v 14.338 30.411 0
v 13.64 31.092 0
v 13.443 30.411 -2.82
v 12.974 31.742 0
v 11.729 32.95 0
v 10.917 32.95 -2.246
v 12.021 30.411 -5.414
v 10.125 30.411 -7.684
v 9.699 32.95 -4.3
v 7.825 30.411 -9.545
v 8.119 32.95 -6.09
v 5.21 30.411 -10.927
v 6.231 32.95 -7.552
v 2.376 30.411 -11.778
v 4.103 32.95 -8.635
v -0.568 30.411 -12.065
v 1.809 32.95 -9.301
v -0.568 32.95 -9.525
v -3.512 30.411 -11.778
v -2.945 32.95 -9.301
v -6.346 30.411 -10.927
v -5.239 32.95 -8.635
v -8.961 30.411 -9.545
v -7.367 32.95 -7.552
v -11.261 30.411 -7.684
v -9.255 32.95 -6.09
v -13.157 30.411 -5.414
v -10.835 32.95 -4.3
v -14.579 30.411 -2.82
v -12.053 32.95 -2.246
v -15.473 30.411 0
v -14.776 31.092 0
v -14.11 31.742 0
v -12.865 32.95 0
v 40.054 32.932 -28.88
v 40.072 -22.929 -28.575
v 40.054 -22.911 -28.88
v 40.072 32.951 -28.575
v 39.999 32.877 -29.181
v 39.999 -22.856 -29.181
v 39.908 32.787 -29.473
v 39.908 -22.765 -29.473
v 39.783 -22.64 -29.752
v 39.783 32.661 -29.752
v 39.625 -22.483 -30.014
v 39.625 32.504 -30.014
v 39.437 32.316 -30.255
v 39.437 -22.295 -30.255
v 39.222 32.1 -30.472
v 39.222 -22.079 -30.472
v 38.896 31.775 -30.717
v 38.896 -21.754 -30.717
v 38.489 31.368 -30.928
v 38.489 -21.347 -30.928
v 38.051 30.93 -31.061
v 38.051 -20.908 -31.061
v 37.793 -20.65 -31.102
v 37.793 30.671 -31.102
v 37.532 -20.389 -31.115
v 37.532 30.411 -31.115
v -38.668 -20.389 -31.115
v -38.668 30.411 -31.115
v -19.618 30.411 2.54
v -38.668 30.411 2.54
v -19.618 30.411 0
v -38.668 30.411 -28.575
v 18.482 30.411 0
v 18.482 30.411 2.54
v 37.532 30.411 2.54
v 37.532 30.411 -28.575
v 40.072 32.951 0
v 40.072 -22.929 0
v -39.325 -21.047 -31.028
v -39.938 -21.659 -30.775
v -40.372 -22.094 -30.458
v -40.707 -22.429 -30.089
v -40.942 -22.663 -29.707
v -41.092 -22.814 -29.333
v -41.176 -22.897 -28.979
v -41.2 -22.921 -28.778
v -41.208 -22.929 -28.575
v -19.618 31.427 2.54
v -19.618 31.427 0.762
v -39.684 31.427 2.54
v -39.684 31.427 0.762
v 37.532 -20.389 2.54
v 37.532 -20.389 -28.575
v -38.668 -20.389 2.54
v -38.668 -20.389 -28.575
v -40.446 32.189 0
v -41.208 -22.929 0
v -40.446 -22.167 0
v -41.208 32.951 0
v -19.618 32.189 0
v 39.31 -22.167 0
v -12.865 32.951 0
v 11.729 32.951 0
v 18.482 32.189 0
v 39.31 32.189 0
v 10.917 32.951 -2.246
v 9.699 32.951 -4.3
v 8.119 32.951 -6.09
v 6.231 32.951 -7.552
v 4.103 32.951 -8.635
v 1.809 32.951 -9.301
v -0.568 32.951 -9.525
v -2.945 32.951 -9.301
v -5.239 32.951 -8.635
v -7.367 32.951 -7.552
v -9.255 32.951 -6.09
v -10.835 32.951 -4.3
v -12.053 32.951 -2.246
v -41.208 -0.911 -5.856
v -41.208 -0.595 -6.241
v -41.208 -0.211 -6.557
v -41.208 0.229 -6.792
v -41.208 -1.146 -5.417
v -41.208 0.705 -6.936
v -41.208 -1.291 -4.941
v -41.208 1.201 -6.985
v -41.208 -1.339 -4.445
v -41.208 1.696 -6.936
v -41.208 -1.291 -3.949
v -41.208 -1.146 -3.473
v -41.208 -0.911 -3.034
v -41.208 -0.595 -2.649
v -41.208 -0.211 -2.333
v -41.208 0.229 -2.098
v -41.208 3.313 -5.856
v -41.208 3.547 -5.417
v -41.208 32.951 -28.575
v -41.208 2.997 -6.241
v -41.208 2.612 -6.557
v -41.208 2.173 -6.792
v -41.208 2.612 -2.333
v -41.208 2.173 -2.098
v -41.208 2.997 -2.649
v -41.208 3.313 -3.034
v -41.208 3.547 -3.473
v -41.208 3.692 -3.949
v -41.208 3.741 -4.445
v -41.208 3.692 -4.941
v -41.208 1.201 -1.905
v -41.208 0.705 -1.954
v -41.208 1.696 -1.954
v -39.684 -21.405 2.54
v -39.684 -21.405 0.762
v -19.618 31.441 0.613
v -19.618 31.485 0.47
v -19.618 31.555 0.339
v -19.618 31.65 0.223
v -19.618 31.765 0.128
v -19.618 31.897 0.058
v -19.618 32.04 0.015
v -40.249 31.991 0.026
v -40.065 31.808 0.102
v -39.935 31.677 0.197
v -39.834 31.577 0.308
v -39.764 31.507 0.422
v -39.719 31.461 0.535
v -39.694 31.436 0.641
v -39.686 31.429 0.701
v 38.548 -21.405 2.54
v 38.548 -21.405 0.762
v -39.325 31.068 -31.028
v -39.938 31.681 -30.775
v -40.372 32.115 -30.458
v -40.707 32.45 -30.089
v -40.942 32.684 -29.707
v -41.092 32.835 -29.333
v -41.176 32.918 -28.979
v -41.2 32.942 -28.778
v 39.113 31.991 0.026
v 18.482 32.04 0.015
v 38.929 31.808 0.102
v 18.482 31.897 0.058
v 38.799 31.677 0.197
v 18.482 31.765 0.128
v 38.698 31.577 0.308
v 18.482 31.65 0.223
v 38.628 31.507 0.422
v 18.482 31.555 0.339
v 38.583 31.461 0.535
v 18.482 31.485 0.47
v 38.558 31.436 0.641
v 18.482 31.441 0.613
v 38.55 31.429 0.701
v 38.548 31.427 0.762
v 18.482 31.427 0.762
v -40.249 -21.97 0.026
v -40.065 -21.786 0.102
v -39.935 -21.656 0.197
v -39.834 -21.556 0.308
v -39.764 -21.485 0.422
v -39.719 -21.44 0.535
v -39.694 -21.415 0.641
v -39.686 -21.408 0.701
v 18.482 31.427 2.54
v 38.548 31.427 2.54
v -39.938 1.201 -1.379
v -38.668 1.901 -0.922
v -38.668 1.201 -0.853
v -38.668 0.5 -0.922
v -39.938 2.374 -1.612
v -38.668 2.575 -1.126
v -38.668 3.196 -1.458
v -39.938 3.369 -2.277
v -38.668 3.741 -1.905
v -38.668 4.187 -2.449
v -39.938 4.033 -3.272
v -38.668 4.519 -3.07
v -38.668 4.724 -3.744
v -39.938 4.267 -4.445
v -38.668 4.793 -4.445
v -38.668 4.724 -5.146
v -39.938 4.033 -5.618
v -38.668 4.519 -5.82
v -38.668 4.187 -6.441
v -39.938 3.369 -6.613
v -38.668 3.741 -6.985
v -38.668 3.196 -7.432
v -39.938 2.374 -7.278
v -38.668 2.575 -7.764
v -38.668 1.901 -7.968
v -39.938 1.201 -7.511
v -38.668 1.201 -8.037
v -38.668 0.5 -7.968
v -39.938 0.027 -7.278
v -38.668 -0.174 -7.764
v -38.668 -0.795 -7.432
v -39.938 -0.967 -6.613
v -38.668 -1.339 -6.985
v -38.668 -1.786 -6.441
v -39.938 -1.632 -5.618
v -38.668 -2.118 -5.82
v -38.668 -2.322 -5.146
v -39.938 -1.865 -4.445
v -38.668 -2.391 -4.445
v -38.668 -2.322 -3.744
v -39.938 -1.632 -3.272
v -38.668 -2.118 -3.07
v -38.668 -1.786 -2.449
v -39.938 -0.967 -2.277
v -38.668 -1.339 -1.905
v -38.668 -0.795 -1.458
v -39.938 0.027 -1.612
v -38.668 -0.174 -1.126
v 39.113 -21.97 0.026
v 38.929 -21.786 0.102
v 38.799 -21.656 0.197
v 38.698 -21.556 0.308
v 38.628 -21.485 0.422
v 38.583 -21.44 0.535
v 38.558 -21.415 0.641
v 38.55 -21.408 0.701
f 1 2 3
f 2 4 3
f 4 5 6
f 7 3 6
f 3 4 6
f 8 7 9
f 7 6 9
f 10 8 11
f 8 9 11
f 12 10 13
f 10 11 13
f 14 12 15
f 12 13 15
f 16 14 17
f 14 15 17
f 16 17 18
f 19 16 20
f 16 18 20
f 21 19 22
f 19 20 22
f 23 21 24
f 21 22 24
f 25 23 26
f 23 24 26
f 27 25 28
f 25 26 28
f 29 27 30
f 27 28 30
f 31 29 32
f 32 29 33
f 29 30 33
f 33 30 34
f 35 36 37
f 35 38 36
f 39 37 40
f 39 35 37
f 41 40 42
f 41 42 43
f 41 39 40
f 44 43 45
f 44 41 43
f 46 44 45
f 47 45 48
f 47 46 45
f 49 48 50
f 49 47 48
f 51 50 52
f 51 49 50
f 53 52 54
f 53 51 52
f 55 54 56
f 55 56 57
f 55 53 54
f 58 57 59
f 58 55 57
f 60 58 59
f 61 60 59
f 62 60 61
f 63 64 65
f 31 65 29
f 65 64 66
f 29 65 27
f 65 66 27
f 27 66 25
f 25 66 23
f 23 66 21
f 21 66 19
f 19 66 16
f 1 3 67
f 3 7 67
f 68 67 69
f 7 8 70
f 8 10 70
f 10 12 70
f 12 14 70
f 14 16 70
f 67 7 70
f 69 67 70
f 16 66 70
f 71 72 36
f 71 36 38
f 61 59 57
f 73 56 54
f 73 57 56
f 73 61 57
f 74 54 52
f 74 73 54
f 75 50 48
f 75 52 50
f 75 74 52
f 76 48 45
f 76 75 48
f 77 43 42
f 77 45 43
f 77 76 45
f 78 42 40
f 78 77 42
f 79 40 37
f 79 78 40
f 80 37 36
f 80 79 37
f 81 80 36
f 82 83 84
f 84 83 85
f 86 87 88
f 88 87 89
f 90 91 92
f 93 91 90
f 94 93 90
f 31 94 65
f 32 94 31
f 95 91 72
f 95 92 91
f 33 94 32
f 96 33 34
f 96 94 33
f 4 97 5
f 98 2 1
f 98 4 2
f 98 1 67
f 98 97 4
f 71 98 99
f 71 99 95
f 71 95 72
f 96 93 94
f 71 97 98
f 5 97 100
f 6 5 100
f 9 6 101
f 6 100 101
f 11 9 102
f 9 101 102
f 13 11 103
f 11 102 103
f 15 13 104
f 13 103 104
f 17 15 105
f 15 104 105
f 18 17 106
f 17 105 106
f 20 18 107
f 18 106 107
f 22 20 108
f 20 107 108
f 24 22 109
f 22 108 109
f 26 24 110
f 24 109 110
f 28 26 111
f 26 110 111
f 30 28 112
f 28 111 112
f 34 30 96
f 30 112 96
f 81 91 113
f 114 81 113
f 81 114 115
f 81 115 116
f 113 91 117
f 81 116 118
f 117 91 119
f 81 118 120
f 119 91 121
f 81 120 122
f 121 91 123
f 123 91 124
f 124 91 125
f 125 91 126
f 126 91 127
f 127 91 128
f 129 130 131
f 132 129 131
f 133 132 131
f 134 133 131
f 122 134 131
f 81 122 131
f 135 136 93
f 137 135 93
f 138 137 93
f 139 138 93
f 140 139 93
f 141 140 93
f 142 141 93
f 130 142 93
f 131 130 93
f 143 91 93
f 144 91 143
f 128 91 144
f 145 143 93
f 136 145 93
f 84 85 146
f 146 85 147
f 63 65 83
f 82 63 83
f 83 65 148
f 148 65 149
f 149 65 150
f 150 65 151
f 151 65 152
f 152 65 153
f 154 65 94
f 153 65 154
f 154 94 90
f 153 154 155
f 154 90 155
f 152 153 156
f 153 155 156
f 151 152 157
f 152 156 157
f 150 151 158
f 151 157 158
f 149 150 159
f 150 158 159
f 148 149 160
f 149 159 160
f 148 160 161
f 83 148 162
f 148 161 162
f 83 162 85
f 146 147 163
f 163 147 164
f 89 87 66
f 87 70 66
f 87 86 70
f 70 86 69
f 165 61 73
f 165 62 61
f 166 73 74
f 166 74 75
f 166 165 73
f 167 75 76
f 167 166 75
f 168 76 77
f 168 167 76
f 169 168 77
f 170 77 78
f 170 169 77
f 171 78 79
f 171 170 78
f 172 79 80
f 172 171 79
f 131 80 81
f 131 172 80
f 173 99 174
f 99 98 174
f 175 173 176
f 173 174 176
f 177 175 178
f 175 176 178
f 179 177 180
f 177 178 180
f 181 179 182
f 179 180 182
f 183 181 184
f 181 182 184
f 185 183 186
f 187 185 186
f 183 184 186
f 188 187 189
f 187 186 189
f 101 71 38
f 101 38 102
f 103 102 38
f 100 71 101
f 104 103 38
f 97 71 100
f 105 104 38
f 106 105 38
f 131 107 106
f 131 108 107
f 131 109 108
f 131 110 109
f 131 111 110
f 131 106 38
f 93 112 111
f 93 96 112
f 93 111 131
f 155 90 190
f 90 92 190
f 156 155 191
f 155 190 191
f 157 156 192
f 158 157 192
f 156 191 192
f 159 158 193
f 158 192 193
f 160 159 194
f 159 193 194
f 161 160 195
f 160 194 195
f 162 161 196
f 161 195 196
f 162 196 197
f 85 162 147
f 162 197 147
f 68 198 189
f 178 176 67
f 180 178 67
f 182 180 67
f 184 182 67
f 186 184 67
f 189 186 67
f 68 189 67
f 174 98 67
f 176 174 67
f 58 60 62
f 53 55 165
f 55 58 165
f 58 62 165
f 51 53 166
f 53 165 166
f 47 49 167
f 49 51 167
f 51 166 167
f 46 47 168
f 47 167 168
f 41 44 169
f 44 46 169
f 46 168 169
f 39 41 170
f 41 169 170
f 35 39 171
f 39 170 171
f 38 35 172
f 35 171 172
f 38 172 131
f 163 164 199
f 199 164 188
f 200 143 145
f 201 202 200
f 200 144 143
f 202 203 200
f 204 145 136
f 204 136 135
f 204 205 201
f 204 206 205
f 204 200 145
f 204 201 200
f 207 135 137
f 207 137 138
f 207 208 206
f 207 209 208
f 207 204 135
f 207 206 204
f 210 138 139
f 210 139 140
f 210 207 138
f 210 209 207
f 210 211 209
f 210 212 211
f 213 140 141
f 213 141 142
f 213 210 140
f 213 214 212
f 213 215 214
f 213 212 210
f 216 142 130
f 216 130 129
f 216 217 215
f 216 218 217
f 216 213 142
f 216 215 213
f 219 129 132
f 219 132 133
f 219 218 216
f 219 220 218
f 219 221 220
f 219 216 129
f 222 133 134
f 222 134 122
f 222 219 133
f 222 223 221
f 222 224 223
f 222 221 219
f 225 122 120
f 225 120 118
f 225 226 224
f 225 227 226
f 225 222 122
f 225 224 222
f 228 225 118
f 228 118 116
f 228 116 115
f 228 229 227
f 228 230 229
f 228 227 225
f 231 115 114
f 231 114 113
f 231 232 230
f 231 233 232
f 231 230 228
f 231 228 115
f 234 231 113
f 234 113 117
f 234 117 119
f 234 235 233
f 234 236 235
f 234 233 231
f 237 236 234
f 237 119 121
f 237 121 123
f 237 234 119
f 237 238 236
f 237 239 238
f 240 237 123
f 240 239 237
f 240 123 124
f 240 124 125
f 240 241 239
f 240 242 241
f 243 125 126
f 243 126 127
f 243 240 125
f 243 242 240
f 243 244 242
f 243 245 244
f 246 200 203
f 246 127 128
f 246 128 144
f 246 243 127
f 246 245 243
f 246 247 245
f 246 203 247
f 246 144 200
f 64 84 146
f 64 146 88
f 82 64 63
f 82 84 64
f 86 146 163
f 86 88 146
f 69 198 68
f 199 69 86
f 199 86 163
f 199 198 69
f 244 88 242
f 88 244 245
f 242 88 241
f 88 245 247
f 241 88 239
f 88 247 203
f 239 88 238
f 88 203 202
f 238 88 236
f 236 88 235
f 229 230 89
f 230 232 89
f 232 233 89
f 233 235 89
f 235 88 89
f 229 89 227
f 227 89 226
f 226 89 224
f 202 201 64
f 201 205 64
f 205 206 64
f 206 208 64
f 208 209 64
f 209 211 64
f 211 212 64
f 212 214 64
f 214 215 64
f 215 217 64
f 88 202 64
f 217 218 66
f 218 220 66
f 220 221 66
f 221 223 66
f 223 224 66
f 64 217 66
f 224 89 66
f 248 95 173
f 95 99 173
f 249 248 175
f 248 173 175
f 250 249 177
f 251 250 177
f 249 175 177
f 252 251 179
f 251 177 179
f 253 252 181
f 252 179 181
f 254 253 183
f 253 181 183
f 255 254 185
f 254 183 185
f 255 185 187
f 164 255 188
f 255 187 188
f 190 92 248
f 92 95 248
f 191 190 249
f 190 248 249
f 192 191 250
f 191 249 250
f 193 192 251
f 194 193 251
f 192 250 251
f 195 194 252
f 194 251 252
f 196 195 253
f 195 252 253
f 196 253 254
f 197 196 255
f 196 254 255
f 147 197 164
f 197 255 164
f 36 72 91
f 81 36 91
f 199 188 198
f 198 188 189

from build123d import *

# Parameters (mm, degrees)
SKETCH2_W           = 81.28
SKETCH2_H           = 55.88
SKETCH2_W_2         = 76.2
SKETCH2_H_2         = 50.8
BOSS_EXTRUDE1_DEPTH = 28.575
SKETCH3_W           = 81.28
SKETCH3_H           = 55.88
BOSS_EXTRUDE2_DEPTH = 2.54
SKETCH6_R           = 2.54
CUT_EXTRUDE2_DEPTH  = 2.54
CHAMFER2_SIZE2      = 1.052102448
CHAMFER2_SIZE       = 2.54
SKETCH7_R           = 12.7
CUT_EXTRUDE5_DEPTH  = 2.54
BOSS_EXTRUDE3_DEPTH = 2.54
CHAMFER3_SIZE       = 2.54
FILLET2_R           = 0.762
FILLET3_R           = 2.54


with BuildPart() as part:
    # Sketch2 → Boss-Extrude1 (new body)
    with BuildSketch(Plane.XY):
        with Locations((-0.567961126, 5.010592309)):
            Rectangle(SKETCH2_W, SKETCH2_H)
        with Locations((-0.567961126, 5.010592309)):
            Rectangle(SKETCH2_W_2, SKETCH2_H_2, mode=Mode.SUBTRACT)
    extrude(amount=-BOSS_EXTRUDE1_DEPTH)

    # Sketch3 → Boss-Extrude2 (add)
    with BuildSketch(Plane(origin=(0, 0, -28.575), x_dir=(-1, 0, 0), z_dir=(0, 0, -1))):
        with Locations((0.567961126, 5.010592309)):
            Rectangle(SKETCH3_W, SKETCH3_H)
    extrude(amount=BOSS_EXTRUDE2_DEPTH)

    # Sketch6 → Cut-Extrude2 (cut)
    with BuildSketch(Plane.ZY.offset(41.207961126)):
        with Locations((-4.445, 1.200592309)):
            Circle(SKETCH6_R)
    extrude(amount=-CUT_EXTRUDE2_DEPTH, mode=Mode.SUBTRACT)

    # Chamfer2
    chamfer2_edges = [part.edges().sort_by_distance(p)[0] for p in [
        (-38.667961126, 1.200592309, -6.985),
    ]]
    chamfer2_side = [part.faces().sort_by_distance(p)[0] for p in [
        (-38.689003175, 1.200592309, -6.985),
    ]]
    chamfer(chamfer2_edges, length=CHAMFER2_SIZE - 0.0001, length2=CHAMFER2_SIZE2 - 0.0001, reference=chamfer2_side[0])  # a hair under: the kernel refuses the full size

    # Sketch7 → Cut-Extrude5 (cut)
    with BuildSketch(Plane(origin=(0, 32.950592309, 0), x_dir=(1, 0, 0), z_dir=(0, 1, 0))):
        with Locations((-0.567961126, -3.175)):
            Circle(SKETCH7_R)
    extrude(amount=-CUT_EXTRUDE5_DEPTH, mode=Mode.SUBTRACT)

    # Sketch8 → Boss-Extrude3 (add)
    with BuildSketch(Plane.XY):
        Polygon((-38.667961126, 30.410592309), (-19.617961126, 30.410592309), (-19.617961126, 31.426592309), (-39.683961126, 31.426592309), (-39.683961126, -21.405407691), (38.548038874, -21.405407691), (38.548038874, 31.426592309), (18.482038874, 31.426592309), (18.482038874, 30.410592309), (37.532038874, 30.410592309), (37.532038874, -20.389407691), (-38.667961126, -20.389407691), align=None)
    extrude(amount=BOSS_EXTRUDE3_DEPTH)

    # Chamfer3
    chamfer3_edges = [part.edges().sort_by_distance(p)[0] for p in [
        (-0.567961126, 30.410592309, -9.525),
    ]]
    chamfer(chamfer3_edges, length=CHAMFER3_SIZE - 0.0001)  # a hair under: the kernel refuses the full size

    # Fillet2
    fillet2_edges = [part.edges().sort_by_distance(p)[0] for p in [
        (-29.650961126, 31.426592309, 0),
        (-39.683961126, 5.010592309, 0),
        (-0.567961126, -21.405407691, 0),
        (38.548038874, 5.010592309, 0),
        (28.515038874, 31.426592309, 0),
    ]]
    fillet(fillet2_edges, radius=FILLET2_R)

    # Fillet3
    fillet3_edges = [part.edges().sort_by_distance(p)[0] for p in [
        (40.072038874, 5.010592309, -31.115),
        (-0.567961126, -22.929407691, -31.115),
        (-41.207961126, 5.010592309, -31.115),
        (-0.567961126, 32.950592309, -31.115),
    ]]
    fillet(fillet3_edges, radius=FILLET3_R)


solid = part.part
